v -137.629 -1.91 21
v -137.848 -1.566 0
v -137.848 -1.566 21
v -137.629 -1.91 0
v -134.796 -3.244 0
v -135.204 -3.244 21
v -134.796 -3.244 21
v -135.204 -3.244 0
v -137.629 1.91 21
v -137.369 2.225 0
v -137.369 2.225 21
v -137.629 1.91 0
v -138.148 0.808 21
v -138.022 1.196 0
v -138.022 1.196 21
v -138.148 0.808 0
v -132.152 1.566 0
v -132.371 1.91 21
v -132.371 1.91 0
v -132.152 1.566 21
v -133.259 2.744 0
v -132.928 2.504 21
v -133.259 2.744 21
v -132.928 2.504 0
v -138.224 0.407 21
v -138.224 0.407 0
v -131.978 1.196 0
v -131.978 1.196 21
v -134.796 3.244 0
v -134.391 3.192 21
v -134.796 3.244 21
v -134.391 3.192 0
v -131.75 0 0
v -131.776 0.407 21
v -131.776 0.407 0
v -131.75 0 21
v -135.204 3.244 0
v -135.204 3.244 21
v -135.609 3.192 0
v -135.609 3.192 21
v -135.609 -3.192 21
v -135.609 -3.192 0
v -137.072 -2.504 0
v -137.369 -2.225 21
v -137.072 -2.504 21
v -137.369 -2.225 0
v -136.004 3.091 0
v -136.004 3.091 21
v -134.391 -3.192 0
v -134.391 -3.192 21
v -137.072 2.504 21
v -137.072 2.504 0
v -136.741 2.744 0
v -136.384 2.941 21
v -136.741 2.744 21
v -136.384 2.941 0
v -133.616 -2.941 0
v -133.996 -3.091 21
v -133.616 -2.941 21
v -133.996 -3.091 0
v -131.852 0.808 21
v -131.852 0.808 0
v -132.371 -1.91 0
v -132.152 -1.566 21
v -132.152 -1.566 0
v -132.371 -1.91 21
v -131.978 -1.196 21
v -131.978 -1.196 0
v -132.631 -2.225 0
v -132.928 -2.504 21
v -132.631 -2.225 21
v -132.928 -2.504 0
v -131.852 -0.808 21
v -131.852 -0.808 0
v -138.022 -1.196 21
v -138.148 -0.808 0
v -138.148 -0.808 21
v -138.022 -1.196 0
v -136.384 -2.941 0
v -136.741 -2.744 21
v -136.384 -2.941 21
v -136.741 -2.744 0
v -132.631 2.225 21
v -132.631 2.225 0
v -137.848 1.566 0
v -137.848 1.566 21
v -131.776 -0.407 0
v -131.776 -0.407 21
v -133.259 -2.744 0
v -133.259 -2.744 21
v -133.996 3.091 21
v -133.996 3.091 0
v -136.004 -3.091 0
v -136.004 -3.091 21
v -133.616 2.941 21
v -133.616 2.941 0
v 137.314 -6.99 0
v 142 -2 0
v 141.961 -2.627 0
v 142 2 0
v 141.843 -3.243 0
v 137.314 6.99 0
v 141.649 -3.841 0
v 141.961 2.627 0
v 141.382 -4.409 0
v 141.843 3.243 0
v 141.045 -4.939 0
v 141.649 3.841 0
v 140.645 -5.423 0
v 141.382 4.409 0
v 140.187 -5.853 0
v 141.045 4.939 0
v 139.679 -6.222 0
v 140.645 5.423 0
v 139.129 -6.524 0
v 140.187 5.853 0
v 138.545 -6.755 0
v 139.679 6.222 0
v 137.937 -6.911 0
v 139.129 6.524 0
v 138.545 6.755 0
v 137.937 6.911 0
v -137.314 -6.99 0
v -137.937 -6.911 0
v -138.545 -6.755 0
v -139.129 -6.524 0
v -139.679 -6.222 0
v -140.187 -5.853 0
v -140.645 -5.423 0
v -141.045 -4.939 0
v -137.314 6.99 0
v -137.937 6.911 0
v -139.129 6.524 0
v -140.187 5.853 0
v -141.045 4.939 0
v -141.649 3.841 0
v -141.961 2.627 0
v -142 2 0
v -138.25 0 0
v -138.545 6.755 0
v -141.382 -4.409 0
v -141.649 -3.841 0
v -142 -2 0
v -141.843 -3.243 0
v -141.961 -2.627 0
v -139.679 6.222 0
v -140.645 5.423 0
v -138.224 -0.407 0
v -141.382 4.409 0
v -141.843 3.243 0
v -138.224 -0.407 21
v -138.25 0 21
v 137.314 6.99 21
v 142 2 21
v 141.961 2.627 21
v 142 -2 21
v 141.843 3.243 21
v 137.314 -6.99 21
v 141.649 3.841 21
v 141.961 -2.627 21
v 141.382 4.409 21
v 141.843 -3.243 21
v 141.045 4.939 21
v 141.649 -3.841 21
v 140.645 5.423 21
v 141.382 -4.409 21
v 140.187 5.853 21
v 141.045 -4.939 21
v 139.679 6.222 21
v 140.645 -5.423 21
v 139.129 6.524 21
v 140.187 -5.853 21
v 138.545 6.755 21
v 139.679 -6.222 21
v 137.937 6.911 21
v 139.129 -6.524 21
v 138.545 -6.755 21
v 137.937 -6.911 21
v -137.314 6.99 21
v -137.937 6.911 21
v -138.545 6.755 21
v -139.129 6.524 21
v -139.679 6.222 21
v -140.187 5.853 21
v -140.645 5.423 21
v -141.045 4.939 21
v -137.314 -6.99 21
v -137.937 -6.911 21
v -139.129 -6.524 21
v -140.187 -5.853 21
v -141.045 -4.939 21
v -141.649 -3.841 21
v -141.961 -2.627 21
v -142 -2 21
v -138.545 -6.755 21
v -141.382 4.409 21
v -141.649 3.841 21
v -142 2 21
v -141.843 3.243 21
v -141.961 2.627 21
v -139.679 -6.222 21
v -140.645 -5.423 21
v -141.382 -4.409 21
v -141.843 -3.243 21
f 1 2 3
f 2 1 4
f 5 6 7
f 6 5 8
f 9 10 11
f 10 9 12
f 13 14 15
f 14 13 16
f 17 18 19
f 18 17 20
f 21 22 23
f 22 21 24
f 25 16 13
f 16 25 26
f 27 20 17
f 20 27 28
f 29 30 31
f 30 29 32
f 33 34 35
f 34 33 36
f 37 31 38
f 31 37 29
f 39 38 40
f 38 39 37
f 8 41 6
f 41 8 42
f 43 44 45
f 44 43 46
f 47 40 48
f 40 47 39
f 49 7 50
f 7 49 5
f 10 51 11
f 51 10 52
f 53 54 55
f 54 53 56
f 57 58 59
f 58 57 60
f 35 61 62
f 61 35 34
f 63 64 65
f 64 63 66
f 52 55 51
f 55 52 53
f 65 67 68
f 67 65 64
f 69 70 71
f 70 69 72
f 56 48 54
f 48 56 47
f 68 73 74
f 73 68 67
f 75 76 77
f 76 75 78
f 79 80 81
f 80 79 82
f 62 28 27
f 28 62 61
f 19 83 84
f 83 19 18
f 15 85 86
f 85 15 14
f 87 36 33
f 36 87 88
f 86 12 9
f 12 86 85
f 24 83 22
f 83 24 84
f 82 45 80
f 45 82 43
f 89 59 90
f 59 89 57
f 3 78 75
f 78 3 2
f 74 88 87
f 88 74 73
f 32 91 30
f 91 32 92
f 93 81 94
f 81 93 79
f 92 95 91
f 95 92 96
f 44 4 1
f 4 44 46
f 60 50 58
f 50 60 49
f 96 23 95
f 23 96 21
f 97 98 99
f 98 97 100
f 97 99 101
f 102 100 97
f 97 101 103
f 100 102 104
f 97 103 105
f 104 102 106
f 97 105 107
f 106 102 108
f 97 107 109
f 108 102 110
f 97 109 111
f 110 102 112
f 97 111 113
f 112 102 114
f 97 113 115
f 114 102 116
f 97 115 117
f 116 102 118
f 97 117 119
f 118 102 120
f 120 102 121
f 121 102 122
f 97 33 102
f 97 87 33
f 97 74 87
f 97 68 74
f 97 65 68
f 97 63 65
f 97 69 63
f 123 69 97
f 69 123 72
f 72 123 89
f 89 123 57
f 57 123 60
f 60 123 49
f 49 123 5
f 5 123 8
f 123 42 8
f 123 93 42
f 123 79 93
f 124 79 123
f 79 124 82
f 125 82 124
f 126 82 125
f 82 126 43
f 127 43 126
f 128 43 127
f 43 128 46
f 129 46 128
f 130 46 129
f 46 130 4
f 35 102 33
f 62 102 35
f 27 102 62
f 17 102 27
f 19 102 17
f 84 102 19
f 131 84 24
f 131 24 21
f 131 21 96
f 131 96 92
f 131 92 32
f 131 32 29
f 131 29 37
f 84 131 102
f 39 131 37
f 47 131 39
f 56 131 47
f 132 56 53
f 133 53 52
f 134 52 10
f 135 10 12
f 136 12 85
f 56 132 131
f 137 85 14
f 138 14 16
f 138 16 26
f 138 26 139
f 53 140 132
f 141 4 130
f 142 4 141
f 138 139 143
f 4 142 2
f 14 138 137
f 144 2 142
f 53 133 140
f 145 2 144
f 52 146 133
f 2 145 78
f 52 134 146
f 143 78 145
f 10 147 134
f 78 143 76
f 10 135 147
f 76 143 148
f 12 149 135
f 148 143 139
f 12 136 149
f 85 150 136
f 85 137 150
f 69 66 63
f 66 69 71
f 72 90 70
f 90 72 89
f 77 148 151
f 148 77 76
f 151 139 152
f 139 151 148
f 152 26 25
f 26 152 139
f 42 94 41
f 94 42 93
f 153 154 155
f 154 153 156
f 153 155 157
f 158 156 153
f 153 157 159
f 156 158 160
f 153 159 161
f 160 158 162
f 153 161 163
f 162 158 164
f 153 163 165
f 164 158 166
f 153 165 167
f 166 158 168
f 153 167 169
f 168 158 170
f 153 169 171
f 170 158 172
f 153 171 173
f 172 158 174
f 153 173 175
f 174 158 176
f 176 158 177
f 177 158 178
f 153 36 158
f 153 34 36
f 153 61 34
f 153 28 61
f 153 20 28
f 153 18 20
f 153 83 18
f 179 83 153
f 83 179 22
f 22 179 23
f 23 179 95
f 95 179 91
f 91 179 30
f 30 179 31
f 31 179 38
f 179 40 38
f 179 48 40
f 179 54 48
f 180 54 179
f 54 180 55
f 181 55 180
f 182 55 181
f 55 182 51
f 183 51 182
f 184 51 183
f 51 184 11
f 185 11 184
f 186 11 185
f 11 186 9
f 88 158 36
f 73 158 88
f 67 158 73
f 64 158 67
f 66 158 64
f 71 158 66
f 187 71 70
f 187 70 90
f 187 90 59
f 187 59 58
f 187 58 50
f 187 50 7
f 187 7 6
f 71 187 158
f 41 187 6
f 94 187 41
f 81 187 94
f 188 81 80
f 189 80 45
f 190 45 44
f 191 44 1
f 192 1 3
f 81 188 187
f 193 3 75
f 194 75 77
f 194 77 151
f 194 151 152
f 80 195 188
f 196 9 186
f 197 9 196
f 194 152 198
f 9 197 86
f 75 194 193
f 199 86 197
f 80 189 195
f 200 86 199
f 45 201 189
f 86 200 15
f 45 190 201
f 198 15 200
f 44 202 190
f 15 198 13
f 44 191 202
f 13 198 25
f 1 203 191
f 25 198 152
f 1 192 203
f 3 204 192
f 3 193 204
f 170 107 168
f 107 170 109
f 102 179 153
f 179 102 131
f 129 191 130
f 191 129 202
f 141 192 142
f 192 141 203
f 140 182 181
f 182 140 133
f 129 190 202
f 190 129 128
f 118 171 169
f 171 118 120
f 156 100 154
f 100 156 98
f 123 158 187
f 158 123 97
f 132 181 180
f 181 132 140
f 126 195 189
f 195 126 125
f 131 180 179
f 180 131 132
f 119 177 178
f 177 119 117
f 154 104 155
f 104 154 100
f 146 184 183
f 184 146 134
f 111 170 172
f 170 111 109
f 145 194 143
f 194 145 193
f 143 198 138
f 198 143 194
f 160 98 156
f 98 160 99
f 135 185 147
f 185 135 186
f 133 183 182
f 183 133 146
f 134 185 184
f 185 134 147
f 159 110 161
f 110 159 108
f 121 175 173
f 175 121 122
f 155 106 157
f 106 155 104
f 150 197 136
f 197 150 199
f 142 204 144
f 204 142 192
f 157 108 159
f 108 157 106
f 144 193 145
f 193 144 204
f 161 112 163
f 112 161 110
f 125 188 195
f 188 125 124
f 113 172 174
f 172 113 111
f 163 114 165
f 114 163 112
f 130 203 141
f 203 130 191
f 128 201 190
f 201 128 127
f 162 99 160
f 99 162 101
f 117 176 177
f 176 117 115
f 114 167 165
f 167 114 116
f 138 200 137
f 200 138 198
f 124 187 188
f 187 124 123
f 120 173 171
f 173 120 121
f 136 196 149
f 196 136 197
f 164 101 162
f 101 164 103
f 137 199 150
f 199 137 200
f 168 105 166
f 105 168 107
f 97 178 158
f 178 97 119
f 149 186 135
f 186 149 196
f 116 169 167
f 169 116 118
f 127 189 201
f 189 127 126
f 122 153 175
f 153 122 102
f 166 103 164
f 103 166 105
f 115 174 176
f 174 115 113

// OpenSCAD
$fn = 50;


difference() {
	union() {
		hull() {
			translate(v = [-137.0000000000, 2.0000000000, 0]) {
				cylinder(h = 21, r = 5);
			}
			translate(v = [137.0000000000, 2.0000000000, 0]) {
				cylinder(h = 21, r = 5);
			}
			translate(v = [-137.0000000000, -2.0000000000, 0]) {
				cylinder(h = 21, r = 5);
			}
			translate(v = [137.0000000000, -2.0000000000, 0]) {
				cylinder(h = 21, r = 5);
			}
		}
	}
	union() {
		translate(v = [-135.0000000000, 0.0000000000, 0]) {
			cylinder(h = 21, r = 3.2500000000);
		}
		translate(v = [-135.0000000000, 0.0000000000, 0]) {
			cylinder(h = 21, r = 1.8000000000);
		}
		translate(v = [-135.0000000000, 0.0000000000, 0]) {
			cylinder(h = 21, r = 1.8000000000);
		}
		translate(v = [-135.0000000000, 0.0000000000, 0]) {
			cylinder(h = 21, r = 1.8000000000);
		}
	}
}
